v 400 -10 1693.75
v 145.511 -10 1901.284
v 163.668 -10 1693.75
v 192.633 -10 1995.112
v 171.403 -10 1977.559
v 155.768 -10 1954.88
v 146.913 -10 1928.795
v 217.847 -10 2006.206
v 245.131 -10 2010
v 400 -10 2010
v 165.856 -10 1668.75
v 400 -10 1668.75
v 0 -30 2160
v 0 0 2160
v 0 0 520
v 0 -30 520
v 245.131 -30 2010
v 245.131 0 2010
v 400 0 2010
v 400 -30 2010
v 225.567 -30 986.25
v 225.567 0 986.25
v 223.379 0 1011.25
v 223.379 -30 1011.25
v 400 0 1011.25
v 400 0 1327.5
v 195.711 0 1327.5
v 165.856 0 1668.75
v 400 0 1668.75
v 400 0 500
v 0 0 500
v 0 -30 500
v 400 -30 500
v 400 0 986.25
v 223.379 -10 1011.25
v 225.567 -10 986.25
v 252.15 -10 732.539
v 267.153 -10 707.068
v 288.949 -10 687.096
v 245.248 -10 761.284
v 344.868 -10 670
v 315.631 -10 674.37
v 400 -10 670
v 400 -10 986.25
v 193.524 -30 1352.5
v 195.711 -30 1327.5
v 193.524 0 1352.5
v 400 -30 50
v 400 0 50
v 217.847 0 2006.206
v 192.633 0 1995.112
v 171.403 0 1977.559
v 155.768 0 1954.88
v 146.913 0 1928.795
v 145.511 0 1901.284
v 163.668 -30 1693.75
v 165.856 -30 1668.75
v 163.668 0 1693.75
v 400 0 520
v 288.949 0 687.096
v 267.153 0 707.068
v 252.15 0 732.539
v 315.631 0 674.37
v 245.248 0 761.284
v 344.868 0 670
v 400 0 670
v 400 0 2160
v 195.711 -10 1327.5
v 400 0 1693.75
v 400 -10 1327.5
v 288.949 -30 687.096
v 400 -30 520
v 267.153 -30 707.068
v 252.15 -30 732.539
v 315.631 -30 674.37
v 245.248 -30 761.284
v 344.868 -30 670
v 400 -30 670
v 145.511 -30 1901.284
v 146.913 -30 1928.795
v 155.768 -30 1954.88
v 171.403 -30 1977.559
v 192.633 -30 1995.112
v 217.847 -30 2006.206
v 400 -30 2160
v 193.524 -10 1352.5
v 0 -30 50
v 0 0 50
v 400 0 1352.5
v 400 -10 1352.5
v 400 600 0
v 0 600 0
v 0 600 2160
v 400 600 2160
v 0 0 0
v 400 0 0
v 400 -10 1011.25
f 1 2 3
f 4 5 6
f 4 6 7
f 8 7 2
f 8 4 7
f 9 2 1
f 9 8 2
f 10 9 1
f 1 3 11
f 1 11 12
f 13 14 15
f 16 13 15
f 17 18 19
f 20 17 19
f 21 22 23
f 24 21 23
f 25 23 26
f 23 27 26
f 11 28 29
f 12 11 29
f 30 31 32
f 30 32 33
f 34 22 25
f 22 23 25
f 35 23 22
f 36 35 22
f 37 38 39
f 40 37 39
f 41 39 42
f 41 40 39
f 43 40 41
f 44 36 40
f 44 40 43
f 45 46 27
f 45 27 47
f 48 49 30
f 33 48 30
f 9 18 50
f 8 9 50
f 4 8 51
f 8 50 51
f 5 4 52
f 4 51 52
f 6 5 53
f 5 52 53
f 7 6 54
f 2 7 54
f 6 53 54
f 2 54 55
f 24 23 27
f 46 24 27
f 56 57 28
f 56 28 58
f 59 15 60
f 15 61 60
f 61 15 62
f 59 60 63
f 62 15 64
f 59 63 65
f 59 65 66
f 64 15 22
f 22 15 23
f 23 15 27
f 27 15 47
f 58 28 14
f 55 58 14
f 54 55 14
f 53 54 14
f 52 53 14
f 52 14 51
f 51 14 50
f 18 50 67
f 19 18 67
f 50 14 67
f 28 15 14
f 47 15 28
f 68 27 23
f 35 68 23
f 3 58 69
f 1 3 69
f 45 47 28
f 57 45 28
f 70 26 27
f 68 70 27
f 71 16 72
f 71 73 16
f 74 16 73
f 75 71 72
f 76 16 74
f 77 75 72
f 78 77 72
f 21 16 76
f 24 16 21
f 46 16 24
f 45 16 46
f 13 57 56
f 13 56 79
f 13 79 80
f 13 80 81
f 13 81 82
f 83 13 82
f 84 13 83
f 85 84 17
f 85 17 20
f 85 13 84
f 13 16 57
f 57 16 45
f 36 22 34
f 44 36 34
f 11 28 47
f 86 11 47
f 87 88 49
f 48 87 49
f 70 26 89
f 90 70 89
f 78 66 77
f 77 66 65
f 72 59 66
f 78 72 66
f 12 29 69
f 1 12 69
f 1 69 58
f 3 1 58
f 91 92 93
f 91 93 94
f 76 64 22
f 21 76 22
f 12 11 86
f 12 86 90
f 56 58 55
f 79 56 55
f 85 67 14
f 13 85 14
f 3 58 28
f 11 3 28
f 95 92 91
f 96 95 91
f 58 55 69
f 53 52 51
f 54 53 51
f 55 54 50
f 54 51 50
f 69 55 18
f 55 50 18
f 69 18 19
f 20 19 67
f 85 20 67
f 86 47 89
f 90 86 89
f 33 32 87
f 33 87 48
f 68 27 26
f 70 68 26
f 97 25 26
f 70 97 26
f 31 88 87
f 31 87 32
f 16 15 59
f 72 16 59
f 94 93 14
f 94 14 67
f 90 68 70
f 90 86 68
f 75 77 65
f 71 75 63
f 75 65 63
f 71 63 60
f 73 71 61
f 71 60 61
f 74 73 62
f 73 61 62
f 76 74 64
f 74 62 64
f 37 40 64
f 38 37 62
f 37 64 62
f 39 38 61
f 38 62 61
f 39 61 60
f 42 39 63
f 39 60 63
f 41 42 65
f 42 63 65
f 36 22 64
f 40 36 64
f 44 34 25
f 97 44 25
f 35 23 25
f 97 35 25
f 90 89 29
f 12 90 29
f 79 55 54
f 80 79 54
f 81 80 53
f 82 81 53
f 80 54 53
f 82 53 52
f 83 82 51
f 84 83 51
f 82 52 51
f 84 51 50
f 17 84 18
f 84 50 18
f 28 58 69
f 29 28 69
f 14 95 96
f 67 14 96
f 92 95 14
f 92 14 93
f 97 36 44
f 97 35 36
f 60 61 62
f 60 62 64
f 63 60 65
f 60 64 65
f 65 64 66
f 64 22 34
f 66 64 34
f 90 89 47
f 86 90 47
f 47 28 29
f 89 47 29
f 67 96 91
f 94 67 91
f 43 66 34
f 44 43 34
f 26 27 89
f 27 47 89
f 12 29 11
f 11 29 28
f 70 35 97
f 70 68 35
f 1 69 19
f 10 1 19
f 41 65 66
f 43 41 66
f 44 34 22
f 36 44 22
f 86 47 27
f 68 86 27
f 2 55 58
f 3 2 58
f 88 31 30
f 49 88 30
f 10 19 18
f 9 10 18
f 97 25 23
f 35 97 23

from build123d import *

# Parameters (mm, degrees)
F1_W     = 400
F1_H     = 600
F2_DEPTH = 2160
F3_W     = 400
F3_H     = 450
F4_DEPTH = 30
F5_DEPTH = 10
F6_DEPTH = 10


with BuildPart() as f2:
    # F1 (on Top) → F2 (new body)
    with BuildSketch(Plane.XY):
        with Locations((200, 300)):
            Rectangle(F1_W, F1_H)
    extrude(amount=F2_DEPTH)


with BuildPart() as f4:
    # F3 (on face) → F4 (new body)
    with BuildSketch(Plane.XZ):
        with Locations((200, 275)):
            Rectangle(F3_W, F3_H)
    extrude(amount=F4_DEPTH)


with BuildPart() as f4b:
    # F3 (on face) → F4, piece 2 (new body)
    with BuildSketch(Plane.XZ):
        with BuildLine():
            Line((0, 2160), (0, 520))
            Line((0, 520), (400, 520))
            Line((400, 520), (400, 670))
            Line((400, 670), (344.8679265265, 670))
            ThreePointArc((344.8679265265, 670), (277.3089057649, 696.272266319), (245.2484567173, 761.2844257252))
            Line((245.2484567173, 761.2844257252), (225.5665192847, 986.25))
            Line((225.5665192847, 986.25), (223.3793026965, 1011.25))
            Line((223.3793026965, 1011.25), (195.7110128564, 1327.5))
            Line((195.7110128564, 1327.5), (193.5237962683, 1352.5))
            Line((193.5237962683, 1352.5), (165.8555064282, 1668.75))
            Line((165.8555064282, 1668.75), (163.6682898401, 1693.75))
            Line((163.6682898401, 1693.75), (145.5113802978, 1901.2844257252))
            ThreePointArc((145.5113802978, 1901.2844257252), (171.4031164259, 1977.5590207616), (245.1308501069, 2010))
            Line((245.1308501069, 2010), (400, 2010))
            Line((400, 2010), (400, 2160))
            Line((400, 2160), (0, 2160))
        make_face()
    extrude(amount=F4_DEPTH)


with BuildPart() as f5:
    # F3 (on face) → F5 (new body)
    with BuildSketch(Plane.XZ):
        with BuildLine():
            Line((400, 1693.75), (400, 2010))
            Line((400, 2010), (245.1308501069, 2010))
            ThreePointArc((245.1308501069, 2010), (171.4031164259, 1977.5590207616), (145.5113802978, 1901.2844257252))
            Line((145.5113802978, 1901.2844257252), (163.6682898401, 1693.75))
            Line((163.6682898401, 1693.75), (400, 1693.75))
        make_face()
    extrude(amount=F5_DEPTH)


with BuildPart() as f5b:
    # F3 (on face) → F5, piece 2 (new body)
    with BuildSketch(Plane.XZ):
        Polygon((400, 1352.5), (400, 1668.75), (165.8555064282, 1668.75), (193.5237962683, 1352.5), align=None)
    extrude(amount=F5_DEPTH)


with BuildPart() as f5c:
    # F3 (on face) → F5, piece 3 (new body)
    with BuildSketch(Plane.XZ):
        Polygon((223.3793026965, 1011.25), (400, 1011.25), (400, 1327.5), (195.7110128564, 1327.5), align=None)
    extrude(amount=F5_DEPTH)


with BuildPart() as f5d:
    # F3 (on face) → F5, piece 4 (new body)
    with BuildSketch(Plane.XZ):
        with BuildLine():
            Line((344.8679265265, 670), (400, 670))
            Line((400, 670), (400, 986.25))
            Line((400, 986.25), (225.5665192847, 986.25))
            Line((225.5665192847, 986.25), (245.2484567173, 761.2844257252))
            ThreePointArc((245.2484567173, 761.2844257252), (277.3089057649, 696.272266319), (344.8679265265, 670))
        make_face()
    extrude(amount=F5_DEPTH)


with BuildPart() as f6:
    # F3 (on face) → F6 (new body)
    with BuildSketch(Plane.XZ):
        Polygon((400, 1668.75), (400, 1693.75), (163.6682898401, 1693.75), (165.8555064282, 1668.75), align=None)
    extrude(amount=F6_DEPTH)


with BuildPart() as f6b:
    # F3 (on face) → F6, piece 2 (new body)
    with BuildSketch(Plane.XZ):
        Polygon((195.7110128564, 1327.5), (400, 1327.5), (400, 1352.5), (193.5237962683, 1352.5), align=None)
    extrude(amount=F6_DEPTH)


with BuildPart() as f6c:
    # F3 (on face) → F6, piece 3 (new body)
    with BuildSketch(Plane.XZ):
        Polygon((225.5665192847, 986.25), (400, 986.25), (400, 1011.25), (223.3793026965, 1011.25), align=None)
    extrude(amount=F6_DEPTH)


solid = Compound([f2.part, f4.part, f4b.part, f5.part, f5b.part, f5c.part, f5d.part, f6.part, f6b.part, f6c.part])
